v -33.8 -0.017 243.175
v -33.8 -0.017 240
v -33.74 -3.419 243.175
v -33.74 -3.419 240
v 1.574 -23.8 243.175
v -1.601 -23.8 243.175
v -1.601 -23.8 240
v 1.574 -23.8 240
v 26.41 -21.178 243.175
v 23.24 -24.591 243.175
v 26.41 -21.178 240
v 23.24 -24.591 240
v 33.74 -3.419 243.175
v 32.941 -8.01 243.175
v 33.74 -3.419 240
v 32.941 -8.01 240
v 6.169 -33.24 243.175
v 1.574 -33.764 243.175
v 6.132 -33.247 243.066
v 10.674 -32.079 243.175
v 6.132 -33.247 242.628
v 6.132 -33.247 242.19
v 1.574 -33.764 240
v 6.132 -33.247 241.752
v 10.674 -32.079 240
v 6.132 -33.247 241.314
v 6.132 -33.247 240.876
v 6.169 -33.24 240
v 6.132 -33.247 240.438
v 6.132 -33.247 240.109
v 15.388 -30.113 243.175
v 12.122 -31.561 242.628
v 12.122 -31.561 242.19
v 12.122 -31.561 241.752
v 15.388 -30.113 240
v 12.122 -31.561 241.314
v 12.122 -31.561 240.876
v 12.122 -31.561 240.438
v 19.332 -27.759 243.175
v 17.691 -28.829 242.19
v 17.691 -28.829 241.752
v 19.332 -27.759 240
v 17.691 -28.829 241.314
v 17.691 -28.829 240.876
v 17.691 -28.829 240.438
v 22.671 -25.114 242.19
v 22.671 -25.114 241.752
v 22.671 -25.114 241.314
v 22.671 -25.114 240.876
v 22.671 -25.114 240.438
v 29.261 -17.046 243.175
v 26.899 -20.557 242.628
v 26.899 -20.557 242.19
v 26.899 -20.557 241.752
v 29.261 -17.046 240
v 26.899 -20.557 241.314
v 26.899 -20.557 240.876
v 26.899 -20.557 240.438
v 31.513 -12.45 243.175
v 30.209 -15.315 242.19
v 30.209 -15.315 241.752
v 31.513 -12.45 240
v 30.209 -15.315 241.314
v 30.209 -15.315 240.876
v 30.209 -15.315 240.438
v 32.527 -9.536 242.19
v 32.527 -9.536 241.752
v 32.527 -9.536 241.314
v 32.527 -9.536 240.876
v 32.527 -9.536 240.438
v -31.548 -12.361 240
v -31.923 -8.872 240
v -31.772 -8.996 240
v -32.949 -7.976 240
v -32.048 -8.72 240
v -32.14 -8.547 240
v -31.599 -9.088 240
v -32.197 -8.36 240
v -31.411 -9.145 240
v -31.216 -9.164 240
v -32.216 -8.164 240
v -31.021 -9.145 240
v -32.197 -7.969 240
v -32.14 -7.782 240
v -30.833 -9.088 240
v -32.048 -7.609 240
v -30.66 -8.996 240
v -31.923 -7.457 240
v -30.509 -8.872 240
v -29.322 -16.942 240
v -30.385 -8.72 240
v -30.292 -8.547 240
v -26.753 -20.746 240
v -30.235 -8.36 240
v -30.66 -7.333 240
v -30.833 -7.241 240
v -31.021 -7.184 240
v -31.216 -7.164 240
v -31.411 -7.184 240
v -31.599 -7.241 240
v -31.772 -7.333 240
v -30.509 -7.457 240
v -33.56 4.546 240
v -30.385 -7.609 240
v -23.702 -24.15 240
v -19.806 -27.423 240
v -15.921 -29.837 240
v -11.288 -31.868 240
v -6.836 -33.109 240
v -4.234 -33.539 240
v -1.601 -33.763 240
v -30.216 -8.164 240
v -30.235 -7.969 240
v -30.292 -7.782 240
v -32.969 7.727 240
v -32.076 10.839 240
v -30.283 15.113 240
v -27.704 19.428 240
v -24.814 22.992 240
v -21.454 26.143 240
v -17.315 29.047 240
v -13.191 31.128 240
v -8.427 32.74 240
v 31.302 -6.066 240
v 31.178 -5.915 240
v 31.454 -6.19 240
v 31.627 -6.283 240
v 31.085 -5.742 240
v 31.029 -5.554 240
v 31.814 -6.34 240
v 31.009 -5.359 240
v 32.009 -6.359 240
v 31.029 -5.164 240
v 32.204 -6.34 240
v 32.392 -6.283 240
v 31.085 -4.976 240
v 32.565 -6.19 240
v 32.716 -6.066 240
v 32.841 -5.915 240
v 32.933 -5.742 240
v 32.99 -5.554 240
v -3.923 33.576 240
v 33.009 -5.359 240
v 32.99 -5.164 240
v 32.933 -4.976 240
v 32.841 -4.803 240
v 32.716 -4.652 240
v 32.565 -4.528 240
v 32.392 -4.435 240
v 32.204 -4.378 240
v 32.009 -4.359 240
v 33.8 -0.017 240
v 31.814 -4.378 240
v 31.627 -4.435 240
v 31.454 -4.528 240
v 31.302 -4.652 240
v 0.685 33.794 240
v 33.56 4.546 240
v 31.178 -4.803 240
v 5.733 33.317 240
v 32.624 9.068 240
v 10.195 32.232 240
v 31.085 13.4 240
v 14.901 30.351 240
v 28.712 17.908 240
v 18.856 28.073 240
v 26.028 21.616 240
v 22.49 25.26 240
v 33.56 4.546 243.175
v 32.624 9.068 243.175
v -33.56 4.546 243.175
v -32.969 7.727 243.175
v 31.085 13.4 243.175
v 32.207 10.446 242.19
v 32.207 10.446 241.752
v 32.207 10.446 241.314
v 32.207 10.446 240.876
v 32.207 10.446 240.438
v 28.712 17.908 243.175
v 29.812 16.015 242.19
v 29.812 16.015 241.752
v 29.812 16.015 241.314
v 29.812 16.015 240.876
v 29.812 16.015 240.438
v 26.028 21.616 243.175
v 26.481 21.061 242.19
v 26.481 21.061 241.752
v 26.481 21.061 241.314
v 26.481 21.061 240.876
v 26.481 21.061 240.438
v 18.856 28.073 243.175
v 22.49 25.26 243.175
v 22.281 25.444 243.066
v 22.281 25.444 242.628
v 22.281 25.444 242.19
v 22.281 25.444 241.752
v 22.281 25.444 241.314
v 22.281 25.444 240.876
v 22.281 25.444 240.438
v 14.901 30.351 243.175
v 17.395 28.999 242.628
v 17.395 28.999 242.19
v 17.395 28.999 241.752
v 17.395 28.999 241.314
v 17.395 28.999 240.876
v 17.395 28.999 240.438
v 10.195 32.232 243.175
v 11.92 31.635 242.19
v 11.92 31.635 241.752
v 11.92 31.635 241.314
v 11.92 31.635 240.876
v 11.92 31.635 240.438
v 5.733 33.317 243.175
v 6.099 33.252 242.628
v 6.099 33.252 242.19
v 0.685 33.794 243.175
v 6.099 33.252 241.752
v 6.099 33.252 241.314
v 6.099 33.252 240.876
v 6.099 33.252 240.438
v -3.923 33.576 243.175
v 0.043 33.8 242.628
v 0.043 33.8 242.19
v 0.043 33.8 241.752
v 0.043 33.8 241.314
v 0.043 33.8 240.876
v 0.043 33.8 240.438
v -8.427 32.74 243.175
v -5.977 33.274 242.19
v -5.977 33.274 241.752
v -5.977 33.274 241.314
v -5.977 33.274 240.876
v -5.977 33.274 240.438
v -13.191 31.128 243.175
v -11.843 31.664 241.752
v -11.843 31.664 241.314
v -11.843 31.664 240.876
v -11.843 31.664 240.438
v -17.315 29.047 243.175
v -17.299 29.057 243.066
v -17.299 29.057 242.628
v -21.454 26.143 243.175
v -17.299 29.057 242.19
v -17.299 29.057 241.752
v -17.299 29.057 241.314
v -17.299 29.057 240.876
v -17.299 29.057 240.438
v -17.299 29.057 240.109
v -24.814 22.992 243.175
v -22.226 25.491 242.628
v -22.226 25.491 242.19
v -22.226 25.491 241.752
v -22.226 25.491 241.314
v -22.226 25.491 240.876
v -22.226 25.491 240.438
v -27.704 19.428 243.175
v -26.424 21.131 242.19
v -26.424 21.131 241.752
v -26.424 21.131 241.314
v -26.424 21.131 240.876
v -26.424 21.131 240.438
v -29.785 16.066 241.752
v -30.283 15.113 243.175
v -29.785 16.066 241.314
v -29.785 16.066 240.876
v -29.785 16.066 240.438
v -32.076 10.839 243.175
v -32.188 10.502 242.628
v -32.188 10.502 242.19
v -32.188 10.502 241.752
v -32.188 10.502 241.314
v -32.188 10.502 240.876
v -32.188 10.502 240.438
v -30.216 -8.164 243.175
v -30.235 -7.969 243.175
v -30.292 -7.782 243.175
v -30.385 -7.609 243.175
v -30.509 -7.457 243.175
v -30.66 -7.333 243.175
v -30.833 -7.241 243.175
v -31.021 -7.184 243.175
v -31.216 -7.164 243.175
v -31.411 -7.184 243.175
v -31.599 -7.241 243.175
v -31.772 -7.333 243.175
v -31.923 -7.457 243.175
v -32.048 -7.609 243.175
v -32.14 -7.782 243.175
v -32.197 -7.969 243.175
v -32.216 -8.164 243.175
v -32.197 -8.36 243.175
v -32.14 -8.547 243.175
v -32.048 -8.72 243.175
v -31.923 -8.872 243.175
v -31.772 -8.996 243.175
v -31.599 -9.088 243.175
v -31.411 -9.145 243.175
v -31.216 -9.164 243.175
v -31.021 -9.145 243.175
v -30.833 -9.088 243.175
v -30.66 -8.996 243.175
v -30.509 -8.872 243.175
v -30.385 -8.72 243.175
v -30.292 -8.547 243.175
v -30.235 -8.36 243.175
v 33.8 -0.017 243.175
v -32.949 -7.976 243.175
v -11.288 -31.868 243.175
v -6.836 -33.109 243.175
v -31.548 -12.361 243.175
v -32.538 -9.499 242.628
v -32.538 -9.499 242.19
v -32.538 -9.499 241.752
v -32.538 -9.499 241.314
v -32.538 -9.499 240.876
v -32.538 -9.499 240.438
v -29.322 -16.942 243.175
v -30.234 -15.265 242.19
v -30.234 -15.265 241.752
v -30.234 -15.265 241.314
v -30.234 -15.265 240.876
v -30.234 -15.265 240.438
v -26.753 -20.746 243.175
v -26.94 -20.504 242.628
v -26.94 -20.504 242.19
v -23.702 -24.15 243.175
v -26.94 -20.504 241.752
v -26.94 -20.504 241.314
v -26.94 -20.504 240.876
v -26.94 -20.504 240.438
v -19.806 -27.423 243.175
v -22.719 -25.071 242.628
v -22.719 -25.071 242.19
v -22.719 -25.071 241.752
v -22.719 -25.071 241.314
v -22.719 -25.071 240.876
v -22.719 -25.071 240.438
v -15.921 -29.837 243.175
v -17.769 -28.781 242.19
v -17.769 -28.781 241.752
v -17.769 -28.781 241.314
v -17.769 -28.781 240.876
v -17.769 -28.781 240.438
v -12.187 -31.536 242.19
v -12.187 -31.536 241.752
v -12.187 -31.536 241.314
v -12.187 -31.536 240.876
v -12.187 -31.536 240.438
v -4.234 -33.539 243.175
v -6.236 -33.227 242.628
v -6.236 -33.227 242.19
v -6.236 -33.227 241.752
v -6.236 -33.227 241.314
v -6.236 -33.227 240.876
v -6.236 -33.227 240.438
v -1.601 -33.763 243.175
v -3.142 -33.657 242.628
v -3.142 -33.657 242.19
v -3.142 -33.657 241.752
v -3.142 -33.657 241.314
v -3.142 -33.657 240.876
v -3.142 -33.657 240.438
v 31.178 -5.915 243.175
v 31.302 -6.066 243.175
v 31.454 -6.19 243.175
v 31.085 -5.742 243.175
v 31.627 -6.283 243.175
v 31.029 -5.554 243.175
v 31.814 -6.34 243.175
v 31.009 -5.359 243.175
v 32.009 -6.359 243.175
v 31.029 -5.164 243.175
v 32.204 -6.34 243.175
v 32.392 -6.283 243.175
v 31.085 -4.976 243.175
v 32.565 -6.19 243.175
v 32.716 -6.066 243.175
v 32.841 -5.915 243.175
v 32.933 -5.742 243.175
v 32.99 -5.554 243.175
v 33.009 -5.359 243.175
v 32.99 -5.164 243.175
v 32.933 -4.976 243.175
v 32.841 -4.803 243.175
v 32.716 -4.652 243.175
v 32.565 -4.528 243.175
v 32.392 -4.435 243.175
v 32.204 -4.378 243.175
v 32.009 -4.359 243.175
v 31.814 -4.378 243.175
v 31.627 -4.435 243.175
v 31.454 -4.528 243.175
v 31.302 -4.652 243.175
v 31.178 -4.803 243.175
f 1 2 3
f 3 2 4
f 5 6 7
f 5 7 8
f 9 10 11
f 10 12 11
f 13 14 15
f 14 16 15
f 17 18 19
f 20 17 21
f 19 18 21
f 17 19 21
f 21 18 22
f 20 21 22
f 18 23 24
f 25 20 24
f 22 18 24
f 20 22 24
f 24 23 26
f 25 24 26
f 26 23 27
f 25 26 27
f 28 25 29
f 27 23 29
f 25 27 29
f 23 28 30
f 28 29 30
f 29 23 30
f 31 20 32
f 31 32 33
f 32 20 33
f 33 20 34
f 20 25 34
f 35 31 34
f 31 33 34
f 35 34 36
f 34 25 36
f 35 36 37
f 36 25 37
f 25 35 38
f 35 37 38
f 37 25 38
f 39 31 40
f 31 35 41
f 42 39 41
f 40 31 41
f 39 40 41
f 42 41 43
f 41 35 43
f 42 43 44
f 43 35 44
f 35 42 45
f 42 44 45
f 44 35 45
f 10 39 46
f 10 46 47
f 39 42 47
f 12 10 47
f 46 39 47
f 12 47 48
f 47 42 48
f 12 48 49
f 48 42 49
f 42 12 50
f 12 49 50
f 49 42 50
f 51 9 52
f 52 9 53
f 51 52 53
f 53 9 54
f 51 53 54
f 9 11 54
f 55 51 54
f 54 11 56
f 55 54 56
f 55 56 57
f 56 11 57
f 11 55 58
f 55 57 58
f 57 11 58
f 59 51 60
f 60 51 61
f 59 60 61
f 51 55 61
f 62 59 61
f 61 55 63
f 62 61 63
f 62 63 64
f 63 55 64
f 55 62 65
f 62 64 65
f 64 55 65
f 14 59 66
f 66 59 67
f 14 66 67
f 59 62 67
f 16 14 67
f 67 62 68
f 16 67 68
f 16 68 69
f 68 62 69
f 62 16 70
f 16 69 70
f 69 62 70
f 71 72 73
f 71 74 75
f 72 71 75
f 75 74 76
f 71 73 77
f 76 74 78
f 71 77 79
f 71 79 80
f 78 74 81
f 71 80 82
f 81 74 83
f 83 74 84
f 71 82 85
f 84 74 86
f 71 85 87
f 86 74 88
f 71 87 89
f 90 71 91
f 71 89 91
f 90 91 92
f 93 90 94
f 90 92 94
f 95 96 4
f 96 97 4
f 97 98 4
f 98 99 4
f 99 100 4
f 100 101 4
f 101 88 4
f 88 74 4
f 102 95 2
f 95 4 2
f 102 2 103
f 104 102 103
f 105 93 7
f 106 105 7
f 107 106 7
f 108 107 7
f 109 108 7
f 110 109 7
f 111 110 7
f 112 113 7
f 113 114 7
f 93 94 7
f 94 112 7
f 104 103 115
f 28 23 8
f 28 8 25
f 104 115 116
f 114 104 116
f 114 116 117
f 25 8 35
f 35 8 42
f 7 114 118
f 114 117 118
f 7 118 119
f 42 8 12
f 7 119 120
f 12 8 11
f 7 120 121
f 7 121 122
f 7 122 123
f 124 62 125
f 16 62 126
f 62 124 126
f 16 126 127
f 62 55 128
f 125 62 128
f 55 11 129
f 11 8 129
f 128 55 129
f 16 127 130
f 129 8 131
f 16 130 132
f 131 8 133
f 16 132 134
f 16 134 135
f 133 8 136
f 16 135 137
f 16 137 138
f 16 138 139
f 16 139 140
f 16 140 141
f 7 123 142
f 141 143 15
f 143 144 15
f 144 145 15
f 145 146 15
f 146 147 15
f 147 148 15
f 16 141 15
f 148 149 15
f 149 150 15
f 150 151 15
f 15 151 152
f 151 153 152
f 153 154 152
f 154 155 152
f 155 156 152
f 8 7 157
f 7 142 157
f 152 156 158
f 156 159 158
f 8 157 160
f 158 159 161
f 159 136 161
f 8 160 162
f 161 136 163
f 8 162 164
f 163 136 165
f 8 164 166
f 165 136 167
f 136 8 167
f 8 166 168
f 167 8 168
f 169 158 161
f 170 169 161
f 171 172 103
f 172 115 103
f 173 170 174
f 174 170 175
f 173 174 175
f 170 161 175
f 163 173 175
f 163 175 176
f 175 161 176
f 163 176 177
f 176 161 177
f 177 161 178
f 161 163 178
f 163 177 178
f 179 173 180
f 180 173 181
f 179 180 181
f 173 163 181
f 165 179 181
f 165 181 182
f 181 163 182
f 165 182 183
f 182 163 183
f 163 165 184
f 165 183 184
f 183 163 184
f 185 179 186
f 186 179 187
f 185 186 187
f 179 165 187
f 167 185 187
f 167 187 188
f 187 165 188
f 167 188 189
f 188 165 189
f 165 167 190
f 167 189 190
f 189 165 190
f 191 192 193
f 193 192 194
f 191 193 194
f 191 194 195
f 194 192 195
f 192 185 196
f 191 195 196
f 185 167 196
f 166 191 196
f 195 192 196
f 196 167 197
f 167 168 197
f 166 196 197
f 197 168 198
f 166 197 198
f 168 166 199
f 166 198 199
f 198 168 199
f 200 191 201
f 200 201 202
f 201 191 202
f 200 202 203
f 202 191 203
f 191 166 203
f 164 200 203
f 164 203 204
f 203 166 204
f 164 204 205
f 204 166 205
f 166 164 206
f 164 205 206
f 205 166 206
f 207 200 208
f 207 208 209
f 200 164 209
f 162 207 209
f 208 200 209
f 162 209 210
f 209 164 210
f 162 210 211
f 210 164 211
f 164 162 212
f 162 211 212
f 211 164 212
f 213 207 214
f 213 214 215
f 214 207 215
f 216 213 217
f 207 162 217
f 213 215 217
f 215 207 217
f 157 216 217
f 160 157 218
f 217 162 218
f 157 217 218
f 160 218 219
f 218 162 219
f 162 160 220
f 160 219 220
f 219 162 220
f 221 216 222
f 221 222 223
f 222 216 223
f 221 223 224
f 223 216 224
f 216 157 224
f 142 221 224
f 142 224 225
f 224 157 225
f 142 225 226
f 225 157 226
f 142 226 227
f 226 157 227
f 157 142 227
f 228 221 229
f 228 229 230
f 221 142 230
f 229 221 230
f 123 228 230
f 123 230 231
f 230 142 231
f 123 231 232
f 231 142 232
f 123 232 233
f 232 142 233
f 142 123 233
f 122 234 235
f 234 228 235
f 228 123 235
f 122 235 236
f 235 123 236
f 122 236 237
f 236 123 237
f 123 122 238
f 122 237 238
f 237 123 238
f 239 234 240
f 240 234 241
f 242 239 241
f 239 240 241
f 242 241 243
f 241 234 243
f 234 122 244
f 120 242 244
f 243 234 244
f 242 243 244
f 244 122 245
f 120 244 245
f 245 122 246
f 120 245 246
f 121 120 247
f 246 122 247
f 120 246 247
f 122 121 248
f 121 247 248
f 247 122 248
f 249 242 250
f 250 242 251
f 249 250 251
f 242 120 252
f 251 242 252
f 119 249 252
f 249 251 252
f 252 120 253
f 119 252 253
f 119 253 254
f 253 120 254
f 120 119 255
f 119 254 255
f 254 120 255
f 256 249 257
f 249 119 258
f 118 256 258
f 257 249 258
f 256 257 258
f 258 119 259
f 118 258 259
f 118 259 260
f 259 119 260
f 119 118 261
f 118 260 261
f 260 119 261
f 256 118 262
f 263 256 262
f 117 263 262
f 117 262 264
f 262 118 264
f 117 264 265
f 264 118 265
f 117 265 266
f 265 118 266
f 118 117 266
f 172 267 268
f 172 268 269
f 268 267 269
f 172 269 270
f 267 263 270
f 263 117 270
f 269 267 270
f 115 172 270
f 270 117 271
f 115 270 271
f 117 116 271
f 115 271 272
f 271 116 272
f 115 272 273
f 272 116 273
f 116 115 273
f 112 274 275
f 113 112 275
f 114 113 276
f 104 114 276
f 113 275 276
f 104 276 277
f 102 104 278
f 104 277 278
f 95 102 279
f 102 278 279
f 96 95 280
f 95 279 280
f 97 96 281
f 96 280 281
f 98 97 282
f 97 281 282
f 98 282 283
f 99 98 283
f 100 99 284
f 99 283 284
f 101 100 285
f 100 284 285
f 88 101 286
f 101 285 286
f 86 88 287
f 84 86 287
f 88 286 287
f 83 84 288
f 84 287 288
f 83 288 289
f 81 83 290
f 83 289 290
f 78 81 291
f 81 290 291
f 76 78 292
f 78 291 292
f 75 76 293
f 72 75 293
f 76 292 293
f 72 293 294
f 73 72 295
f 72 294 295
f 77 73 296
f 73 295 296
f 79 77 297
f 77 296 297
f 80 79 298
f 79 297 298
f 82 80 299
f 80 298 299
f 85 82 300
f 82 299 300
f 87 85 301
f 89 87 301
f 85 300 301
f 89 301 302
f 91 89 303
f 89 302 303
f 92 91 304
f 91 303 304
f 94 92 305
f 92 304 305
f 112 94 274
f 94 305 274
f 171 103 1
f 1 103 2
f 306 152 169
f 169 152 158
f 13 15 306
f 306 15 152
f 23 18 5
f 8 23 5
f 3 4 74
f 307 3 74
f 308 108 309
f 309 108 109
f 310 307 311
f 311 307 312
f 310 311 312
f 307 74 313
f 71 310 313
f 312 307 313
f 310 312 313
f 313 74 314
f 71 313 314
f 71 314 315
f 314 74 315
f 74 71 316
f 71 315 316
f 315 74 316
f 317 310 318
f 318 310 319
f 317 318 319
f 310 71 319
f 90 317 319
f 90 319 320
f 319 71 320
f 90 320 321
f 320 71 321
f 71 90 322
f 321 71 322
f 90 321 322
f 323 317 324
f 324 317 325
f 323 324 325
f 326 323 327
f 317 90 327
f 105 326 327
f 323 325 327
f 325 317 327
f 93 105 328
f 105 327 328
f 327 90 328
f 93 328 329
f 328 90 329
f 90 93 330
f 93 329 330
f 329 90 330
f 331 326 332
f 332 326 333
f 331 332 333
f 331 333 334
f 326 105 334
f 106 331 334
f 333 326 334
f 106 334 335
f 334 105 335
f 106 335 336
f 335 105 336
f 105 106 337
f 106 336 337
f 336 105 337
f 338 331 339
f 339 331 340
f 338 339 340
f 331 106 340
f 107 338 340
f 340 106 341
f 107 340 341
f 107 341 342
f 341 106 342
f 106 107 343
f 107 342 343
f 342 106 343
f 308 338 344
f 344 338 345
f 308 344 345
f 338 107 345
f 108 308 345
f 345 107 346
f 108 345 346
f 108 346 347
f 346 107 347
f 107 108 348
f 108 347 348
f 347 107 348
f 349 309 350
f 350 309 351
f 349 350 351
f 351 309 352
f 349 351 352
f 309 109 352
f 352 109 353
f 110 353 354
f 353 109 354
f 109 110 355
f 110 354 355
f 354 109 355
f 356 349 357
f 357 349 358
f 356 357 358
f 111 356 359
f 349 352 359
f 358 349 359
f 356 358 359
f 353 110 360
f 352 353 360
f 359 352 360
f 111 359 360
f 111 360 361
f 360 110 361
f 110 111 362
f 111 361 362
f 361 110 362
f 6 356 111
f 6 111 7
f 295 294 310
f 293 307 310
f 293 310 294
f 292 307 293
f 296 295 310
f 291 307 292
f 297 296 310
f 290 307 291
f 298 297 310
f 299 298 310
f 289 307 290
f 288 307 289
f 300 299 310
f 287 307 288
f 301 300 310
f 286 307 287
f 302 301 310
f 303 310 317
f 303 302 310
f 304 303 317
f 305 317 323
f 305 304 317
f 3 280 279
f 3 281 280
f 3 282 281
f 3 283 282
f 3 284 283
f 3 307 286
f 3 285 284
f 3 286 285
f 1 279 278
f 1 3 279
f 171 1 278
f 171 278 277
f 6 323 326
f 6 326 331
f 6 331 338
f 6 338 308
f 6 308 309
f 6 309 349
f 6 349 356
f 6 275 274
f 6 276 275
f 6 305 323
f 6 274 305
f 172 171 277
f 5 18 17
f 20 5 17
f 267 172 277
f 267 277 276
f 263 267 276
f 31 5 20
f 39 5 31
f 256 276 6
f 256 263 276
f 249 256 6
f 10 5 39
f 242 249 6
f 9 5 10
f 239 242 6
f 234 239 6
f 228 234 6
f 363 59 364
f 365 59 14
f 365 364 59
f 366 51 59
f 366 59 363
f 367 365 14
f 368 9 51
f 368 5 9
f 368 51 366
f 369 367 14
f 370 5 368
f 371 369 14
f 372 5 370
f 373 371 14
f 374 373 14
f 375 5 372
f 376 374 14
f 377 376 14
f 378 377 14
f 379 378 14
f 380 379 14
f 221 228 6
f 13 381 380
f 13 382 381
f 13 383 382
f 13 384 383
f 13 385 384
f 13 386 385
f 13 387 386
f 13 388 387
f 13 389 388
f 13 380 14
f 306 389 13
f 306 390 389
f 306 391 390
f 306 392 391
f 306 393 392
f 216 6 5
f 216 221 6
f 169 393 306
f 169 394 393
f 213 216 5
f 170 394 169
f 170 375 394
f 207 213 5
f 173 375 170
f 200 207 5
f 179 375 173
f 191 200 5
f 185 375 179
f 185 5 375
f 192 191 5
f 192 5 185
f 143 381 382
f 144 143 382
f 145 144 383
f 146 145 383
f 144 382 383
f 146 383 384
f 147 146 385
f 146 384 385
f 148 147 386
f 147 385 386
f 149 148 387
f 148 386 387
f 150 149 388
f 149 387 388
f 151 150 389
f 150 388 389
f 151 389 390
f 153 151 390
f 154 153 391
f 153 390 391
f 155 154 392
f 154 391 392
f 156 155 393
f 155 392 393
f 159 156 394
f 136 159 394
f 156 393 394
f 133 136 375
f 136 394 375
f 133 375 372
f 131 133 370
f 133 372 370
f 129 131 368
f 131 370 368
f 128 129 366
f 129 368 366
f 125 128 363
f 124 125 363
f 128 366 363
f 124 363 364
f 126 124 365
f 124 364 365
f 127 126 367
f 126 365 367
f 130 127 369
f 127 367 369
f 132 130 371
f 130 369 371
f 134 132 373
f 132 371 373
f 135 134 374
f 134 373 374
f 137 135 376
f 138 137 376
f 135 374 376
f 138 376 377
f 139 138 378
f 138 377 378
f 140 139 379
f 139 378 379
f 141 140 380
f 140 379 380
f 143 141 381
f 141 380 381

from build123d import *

# Parameters (mm, degrees)
BOSS_EXTRUDE1_DEPTH = 3.175
SKETCH4_R           = 1
CUT_EXTRUDE2_DEPTH  = 3.175
SKETCH5_W           = 3.175
SKETCH5_H           = 10.970571453
CUT_EXTRUDE3_DEPTH  = 48.905713025


with BuildPart() as part:
    # Sketch1 → Boss-Extrude1 (new body)
    with BuildSketch(Plane.XY.offset(240)):
        with BuildLine():
            Line((-33.799525455, -0.017072147), (-33.740147252, -3.418847174))
            add(Edge.make_bspline(
                [(-33.740147252, -3.418847174), (-33.521913435, -5.496739744), (-33.121758608, -7.52360336), (-32.245655467, -10.48651683), (-31.738647045, -11.948631126), (-31.127755378, -13.381606109), (-30.697366268, -14.330435347), (-30.470378572, -14.801900059), (-29.290211733, -17.119612441), (-27.644930506, -19.740333777), (-25.646898465, -22.113857284), (-24.588376817, -23.258919171), (-24.224726915, -23.634521718), (-23.482012785, -24.367327148), (-21.59014774, -26.150424449), (-18.705670827, -28.317861845), (-15.980786711, -29.823605713), (-14.107006772, -30.74768667), (-13.152701084, -31.164175695), (-10.256242476, -32.27934775), (-7.777960893, -32.988270972), (-5.214339656, -33.405899808), (-4.181967985, -33.549320099), (-3.661328308, -33.60925586), (-2.104532681, -33.751997759), (-1.069213869, -33.798542764), (2.029597644, -33.801687472), (4.085962141, -33.622116253), (7.155117004, -33.058726493), (8.178081257, -32.820670852), (10.177000978, -32.256577633), (11.158104767, -31.929888742), (14.04936497, -30.823232748), (15.907936031, -29.917809181), (18.13673294, -28.556406158), (18.576889104, -28.273087614), (19.438710135, -27.689460729), (20.706973253, -26.786573761), (21.903631517, -25.803366446), (23.438553372, -24.424422105), (24.544411843, -23.339363165), (25.578640539, -22.173955923), (26.251776296, -21.378677652), (26.580969723, -20.970778515), (28.17094662, -18.902925334), (29.269671397, -17.152899222), (30.678907287, -14.395868232), (31.108821176, -13.454846631), (31.884053374, -11.526054988), (32.230015293, -10.534907216), (33.119638114, -7.539302803), (33.521651228, -5.499562958), (33.740182048, -3.418847117)],
                knots=[0, 0, 0, 0, 0.0625, 0.0625, 0.09375, 0.109375, 0.109375, 0.125, 0.125, 0.1875, 0.21875, 0.21875, 0.234375, 0.234375, 0.25, 0.3125, 0.34375, 0.34375, 0.375, 0.375, 0.4375, 0.453125, 0.453125, 0.46875, 0.46875, 0.5, 0.5, 0.5625, 0.5625, 0.59375, 0.59375, 0.625, 0.625, 0.6875, 0.6875, 0.703125, 0.703125, 0.71875, 0.75, 0.75, 0.78125, 0.796875, 0.796875, 0.8125, 0.8125, 0.875, 0.875, 0.90625, 0.90625, 0.9375, 0.9375, 1, 1, 1, 1], degree=3))
            Line((33.740182048, -3.418847117), (33.799560251, -0.017072147))
            Line((33.799560251, -0.017072147), (33.560412457, 4.546139609))
            add(Edge.make_bspline(
                [(33.560412457, 4.546139609), (33.282065399, 6.567374379), (32.831372803, 8.534230691), (31.894626922, 11.402256897), (31.361087401, 12.815708643), (30.729491779, 14.19822173), (30.286610148, 15.113013144), (30.053701075, 15.567925007), (28.845742701, 17.805295292), (27.73617385, 19.487837269), (25.852855801, 21.84749908), (25.188593752, 22.606698061), (23.786460552, 24.069913543), (23.045059446, 24.776640829), (20.752328135, 26.778284029), (18.311067746, 28.558159122), (15.640647898, 29.995877244), (14.266739996, 30.656956524), (13.801141084, 30.868163008), (12.864758887, 31.267971853), (12.393699461, 31.456783193), (10.024605965, 32.347483289), (7.115279765, 33.1594713), (4.10232218, 33.57067126), (2.070213322, 33.754033964), (1.053662161, 33.799146951), (-1.978663229, 33.802802386), (-4.487220386, 33.587681269), (-6.97150073, 33.084409187), (-7.963243622, 32.859726611), (-8.459399615, 32.73533069), (-9.933669217, 32.329805435), (-10.897365307, 32.016750487), (-13.734609646, 30.957514861), (-15.554750033, 30.092235814), (-17.734673571, 28.798227251), (-18.165893543, 28.52880028), (-19.018645374, 27.968342063), (-19.439187613, 27.677889019), (-20.673952363, 26.783179445), (-21.465207676, 26.153069384), (-23.74871726, 24.167631397), (-25.151109466, 22.717611147), (-26.742507526, 20.734807748), (-27.053436756, 20.328702835), (-27.654958645, 19.504501759), (-28.525682186, 18.252011757), (-29.304349299, 16.952301265), (-30.745483656, 14.293275375), (-31.551336523, 12.44113352), (-32.506911863, 9.533039369), (-32.781055324, 8.547728647), (-33.237634192, 6.561909519), (-33.420905282, 5.558925362), (-33.560377664, 4.546139552)],
                knots=[0, 0, 0, 0, 0.0625, 0.0625, 0.09375, 0.109375, 0.109375, 0.125, 0.125, 0.1875, 0.1875, 0.21875, 0.21875, 0.25, 0.25, 0.3125, 0.34375, 0.34375, 0.359375, 0.359375, 0.375, 0.375, 0.4375, 0.46875, 0.46875, 0.5, 0.5, 0.5625, 0.578125, 0.578125, 0.59375, 0.59375, 0.625, 0.625, 0.6875, 0.6875, 0.703125, 0.703125, 0.71875, 0.71875, 0.75, 0.75, 0.8125, 0.8125, 0.828125, 0.828125, 0.84375, 0.875, 0.875, 0.9375, 0.9375, 0.96875, 0.96875, 1, 1, 1, 1], degree=3))
            Line((-33.560377664, 4.546139552), (-33.799525455, -0.017072147))
        make_face()
    extrude(amount=BOSS_EXTRUDE1_DEPTH)

    # Sketch4 → Cut-Extrude2 (cut)
    with BuildSketch(Plane.XY.offset(243.175)):
        with Locations((32.009302375, -5.358989516)):
            Circle(SKETCH4_R)
        with Locations((-31.216064399, -8.164436653)):
            Circle(SKETCH4_R)
    extrude(amount=-CUT_EXTRUDE2_DEPTH, mode=Mode.SUBTRACT)

    # Sketch5 → Cut-Extrude3 (cut, through all)
    with BuildSketch(Plane.XY.offset(243.175)):
        with Locations((-0.013127042, -29.284890239)):
            Rectangle(SKETCH5_W, SKETCH5_H)
    extrude(amount=-CUT_EXTRUDE3_DEPTH, mode=Mode.SUBTRACT)


solid = part.part
